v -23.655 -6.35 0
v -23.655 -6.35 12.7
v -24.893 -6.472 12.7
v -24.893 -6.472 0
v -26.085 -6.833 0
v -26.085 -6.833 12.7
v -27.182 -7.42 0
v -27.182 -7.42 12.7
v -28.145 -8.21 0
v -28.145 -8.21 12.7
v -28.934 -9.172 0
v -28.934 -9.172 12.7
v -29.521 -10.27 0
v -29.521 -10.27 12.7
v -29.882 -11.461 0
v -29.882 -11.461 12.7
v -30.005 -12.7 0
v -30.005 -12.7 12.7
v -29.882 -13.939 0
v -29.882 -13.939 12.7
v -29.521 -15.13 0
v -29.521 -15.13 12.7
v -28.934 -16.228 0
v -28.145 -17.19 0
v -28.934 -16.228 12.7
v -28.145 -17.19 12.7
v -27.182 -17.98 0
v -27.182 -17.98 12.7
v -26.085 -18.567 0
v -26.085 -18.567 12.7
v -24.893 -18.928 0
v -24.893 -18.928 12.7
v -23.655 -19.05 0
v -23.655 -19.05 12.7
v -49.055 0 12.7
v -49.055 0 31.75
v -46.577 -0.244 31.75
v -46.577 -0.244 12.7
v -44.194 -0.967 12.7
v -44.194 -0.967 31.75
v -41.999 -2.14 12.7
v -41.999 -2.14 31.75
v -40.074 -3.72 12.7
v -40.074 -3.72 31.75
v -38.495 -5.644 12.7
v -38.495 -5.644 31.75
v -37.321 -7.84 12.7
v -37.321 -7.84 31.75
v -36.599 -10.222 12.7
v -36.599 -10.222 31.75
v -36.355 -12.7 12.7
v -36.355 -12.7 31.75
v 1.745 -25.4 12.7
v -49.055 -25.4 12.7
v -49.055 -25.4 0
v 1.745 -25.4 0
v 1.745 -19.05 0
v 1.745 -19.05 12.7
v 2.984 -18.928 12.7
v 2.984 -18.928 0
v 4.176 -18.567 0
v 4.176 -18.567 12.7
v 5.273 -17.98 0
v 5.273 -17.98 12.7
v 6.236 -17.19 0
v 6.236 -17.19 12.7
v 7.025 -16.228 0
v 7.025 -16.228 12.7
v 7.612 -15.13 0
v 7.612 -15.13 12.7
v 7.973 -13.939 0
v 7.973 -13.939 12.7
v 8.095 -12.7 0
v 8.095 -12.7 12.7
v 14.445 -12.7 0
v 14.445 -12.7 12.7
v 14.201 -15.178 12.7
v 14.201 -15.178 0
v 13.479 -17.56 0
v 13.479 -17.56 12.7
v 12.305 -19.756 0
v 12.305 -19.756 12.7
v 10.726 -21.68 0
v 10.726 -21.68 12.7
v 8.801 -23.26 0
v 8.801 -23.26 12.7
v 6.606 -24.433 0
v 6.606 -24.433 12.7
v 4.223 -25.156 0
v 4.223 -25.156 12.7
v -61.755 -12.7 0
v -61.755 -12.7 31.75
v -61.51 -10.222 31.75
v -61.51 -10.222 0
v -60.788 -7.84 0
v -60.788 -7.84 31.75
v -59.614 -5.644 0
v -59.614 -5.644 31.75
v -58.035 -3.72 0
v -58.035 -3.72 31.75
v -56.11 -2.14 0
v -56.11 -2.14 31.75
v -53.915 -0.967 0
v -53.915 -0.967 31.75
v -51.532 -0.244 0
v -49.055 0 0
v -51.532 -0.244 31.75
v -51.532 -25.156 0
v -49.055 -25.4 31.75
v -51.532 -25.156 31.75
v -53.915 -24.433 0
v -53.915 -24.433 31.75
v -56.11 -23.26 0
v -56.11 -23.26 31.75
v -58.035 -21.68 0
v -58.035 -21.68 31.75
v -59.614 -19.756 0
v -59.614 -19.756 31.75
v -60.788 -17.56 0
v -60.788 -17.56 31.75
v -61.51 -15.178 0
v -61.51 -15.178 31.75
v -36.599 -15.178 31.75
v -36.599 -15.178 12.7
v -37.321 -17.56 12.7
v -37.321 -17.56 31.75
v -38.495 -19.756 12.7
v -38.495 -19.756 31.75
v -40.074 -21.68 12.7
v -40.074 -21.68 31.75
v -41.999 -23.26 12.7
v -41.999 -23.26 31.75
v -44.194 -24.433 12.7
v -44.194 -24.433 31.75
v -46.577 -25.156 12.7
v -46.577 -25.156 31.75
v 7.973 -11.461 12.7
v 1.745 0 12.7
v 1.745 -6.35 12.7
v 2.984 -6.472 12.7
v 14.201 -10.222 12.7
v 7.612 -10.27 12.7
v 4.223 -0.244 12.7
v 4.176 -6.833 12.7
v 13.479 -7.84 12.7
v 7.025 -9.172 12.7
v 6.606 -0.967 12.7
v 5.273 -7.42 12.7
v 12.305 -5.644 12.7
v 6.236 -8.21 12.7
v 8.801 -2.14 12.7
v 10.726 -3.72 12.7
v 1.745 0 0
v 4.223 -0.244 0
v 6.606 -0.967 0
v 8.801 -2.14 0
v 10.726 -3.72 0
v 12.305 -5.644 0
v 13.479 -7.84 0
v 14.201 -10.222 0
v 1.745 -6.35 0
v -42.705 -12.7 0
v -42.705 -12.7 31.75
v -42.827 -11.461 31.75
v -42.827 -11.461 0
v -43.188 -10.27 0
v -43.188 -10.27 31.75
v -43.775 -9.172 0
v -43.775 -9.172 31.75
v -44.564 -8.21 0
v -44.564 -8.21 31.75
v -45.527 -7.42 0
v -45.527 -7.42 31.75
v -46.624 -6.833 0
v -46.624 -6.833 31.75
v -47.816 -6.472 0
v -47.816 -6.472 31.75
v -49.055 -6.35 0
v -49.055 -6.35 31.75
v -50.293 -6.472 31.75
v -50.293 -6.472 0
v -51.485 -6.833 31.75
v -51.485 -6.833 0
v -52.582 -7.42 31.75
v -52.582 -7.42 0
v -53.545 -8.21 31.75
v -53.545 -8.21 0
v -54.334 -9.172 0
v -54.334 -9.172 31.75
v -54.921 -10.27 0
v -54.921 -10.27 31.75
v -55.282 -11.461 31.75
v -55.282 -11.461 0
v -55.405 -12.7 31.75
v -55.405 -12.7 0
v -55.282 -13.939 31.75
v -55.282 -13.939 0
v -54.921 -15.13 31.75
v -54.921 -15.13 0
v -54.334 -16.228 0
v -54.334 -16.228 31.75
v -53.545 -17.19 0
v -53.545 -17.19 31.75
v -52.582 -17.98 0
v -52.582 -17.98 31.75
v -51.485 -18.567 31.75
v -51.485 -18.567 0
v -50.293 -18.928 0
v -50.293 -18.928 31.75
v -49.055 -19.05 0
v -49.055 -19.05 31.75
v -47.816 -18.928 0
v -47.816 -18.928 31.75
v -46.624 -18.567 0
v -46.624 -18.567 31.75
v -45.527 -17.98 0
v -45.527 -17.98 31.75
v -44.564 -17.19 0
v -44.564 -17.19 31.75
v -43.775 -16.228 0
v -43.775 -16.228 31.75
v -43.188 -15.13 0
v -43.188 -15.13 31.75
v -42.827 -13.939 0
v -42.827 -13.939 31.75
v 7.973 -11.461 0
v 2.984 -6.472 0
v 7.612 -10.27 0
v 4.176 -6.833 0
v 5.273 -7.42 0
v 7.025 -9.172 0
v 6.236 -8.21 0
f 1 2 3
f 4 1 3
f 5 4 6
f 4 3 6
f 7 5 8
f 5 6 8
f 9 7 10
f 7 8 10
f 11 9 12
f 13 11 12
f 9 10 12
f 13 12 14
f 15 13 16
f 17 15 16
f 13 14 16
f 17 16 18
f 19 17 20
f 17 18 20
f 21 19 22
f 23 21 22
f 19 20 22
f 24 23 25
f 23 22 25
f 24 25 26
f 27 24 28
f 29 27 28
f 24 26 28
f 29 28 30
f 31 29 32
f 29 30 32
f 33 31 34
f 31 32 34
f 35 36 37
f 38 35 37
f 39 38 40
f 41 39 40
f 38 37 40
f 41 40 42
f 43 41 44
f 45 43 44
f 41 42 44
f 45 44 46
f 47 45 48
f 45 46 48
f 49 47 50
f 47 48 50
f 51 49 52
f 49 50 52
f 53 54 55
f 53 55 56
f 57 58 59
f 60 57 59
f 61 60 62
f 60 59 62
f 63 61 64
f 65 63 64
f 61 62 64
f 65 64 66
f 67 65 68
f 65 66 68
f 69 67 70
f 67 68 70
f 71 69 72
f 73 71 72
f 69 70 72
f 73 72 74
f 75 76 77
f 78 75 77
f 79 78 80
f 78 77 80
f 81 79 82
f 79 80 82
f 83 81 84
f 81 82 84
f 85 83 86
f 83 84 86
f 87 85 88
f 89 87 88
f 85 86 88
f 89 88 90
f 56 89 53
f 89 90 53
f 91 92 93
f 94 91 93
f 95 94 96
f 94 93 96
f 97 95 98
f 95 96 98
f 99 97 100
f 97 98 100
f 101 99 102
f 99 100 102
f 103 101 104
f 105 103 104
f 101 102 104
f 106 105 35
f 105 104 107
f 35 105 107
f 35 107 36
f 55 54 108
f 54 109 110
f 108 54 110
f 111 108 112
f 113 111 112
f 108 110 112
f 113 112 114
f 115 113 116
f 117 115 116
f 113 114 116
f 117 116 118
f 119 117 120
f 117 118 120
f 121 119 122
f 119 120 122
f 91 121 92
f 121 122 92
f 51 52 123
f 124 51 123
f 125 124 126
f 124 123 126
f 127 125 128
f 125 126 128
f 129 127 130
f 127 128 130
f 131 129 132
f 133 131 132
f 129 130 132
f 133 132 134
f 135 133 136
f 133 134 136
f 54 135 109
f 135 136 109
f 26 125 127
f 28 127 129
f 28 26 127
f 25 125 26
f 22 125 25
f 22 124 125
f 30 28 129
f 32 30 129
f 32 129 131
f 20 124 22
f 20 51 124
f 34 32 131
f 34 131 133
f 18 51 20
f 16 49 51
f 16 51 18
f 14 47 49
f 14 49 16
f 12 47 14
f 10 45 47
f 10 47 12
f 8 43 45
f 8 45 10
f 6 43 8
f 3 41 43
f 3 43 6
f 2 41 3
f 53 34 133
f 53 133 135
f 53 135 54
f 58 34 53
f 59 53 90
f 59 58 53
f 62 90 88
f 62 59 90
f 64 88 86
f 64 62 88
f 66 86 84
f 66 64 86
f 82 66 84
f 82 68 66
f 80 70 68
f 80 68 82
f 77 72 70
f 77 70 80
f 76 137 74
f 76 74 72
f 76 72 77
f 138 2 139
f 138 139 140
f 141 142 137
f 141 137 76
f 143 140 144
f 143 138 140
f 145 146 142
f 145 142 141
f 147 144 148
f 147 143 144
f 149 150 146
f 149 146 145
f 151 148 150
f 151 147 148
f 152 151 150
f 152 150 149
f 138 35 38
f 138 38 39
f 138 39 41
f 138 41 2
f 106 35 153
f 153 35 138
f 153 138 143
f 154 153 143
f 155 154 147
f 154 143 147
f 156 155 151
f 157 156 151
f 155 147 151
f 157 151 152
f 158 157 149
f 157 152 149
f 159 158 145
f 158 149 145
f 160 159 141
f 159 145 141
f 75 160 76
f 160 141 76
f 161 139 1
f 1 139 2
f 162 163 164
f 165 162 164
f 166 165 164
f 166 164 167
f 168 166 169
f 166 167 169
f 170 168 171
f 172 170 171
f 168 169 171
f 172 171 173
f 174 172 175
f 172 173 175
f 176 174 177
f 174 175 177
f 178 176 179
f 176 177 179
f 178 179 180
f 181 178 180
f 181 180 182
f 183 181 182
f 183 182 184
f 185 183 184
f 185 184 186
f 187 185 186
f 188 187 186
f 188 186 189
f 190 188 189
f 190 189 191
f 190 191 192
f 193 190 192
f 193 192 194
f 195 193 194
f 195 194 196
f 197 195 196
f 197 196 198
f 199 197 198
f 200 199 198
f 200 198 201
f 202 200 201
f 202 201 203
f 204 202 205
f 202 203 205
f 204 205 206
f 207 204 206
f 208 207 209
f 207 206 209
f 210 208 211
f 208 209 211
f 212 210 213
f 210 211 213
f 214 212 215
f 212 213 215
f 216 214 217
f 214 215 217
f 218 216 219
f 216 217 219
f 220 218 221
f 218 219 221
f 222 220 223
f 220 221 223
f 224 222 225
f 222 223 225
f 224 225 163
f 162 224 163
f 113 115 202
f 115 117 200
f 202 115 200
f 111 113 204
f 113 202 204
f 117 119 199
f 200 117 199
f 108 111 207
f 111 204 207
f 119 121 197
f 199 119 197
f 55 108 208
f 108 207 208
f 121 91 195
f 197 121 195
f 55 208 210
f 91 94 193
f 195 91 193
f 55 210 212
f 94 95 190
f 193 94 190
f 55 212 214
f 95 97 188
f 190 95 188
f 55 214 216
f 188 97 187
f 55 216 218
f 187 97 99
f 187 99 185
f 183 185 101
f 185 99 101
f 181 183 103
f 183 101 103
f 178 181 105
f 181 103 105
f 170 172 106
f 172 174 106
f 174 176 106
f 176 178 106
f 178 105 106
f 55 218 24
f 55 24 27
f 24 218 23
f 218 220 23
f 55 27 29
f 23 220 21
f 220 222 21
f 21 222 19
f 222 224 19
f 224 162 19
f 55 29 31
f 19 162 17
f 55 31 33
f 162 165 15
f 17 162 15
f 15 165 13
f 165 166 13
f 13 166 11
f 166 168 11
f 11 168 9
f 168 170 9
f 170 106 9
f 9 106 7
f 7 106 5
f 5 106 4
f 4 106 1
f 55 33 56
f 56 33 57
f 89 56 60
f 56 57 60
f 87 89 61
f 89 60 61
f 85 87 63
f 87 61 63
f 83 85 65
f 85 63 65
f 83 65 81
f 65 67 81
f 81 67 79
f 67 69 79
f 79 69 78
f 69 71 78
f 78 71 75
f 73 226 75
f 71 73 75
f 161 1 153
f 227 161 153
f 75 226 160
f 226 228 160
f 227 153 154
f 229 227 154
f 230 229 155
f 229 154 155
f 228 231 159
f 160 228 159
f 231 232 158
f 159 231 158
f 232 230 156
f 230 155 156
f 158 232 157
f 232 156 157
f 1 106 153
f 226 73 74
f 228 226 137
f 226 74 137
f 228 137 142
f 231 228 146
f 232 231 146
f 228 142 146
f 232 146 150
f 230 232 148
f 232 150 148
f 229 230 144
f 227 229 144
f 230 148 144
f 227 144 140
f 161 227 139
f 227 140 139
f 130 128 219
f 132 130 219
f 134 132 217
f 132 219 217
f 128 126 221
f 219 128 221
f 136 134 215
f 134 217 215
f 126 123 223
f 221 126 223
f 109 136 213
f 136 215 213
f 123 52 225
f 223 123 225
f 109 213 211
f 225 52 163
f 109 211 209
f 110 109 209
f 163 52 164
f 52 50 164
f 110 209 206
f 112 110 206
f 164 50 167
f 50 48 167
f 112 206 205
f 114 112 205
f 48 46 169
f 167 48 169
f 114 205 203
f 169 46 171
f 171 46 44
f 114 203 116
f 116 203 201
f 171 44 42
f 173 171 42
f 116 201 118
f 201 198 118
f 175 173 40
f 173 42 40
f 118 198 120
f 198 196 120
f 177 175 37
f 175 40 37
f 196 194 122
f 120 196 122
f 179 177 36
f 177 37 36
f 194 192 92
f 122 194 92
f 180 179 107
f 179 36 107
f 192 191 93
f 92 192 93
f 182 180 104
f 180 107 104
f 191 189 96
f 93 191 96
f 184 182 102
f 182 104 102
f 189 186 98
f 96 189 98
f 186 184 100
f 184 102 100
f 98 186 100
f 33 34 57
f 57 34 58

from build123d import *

# Parameters (mm, degrees)
F1_DEPTH  = 25.4
F2_R      = 6.35
F3_DEPTH  = 57.15
F5_DEPTH  = 31.75
F7_DEPTH  = 19.05
F9_DEPTH  = 12.7
F11_DEPTH = 12.7


with BuildPart() as f1:
    # F0 (on Front) → F1 (new body)
    with BuildSketch(Plane.XZ):
        Polygon((-36.3545019062, 31.75), (-61.7545019062, 31.75), (-61.7545019062, 0), (14.4454980938, 0), (14.4454980938, 12.7), (-36.3545019062, 12.7), align=None)
    extrude(amount=F1_DEPTH)

    # F2 (on face) → F3 (cut)
    with BuildSketch(Plane.XY.offset(31.75)):
        with Locations((-49.0545019062, -12.7)):
            Circle(F2_R)
    extrude(amount=-F3_DEPTH, mode=Mode.SUBTRACT)

    # F4 (on face) → F5 (cut)
    with BuildSketch(Plane.XY.offset(31.75)):
        with BuildLine():
            ThreePointArc((-61.7545019062, -12.6999997152), (-58.0347579265, -3.7197437782), (-49.0545019062, 0))
            Line((-49.0545019062, 0), (-61.7545019062, 0))
            Line((-61.7545019062, 0), (-61.7545019062, -12.6999997152))
        make_face()
        with BuildLine():
            Line((-61.7545019062, -25.4), (-49.0545019062, -25.4))
            ThreePointArc((-49.0545019062, -25.4), (-58.0347581279, -21.6802560204), (-61.7545019062, -12.6999997152))
            Line((-61.7545019062, -12.6999997152), (-61.7545019062, -25.4))
        make_face()
    extrude(amount=-F5_DEPTH, mode=Mode.SUBTRACT)

    # F6 (on face) → F7 (cut)
    with BuildSketch(Plane.XY.offset(31.75)):
        with BuildLine():
            ThreePointArc((-49.0545019062, 0), (-40.0742457851, -3.7197438789), (-36.3545019062, -12.7))
            Line((-36.3545019062, -12.7), (-36.3545019062, 0))
            Line((-36.3545019062, 0), (-49.0545019062, 0))
        make_face()
        with BuildLine():
            Line((-36.3545019062, -25.4), (-36.3545019062, -12.7))
            ThreePointArc((-36.3545019062, -12.7), (-40.0742457851, -21.6802561211), (-49.0545019062, -25.4))
            Line((-49.0545019062, -25.4), (-36.3545019062, -25.4))
        make_face()
    extrude(amount=-F7_DEPTH, mode=Mode.SUBTRACT)

    # F8 (on face) → F9 (cut)
    with BuildSketch(Plane.XY.offset(12.7)):
        with BuildLine():
            ThreePointArc((-23.6545019062, -19.05), (-19.1643738456, -17.1901280605), (-17.3045019062, -12.7))
            ThreePointArc((-17.3045019062, -12.7), (-19.1643738456, -8.2098719395), (-23.6545019062, -6.35))
            ThreePointArc((-23.6545019062, -6.35), (-30.0045019062, -12.7), (-23.6545019062, -19.05))
        make_face()
        with BuildLine():
            ThreePointArc((-23.6545019062, -6.35), (-19.1643738456, -8.2098719395), (-17.3045019062, -12.7))
            ThreePointArc((-17.3045019062, -12.7), (-19.1643738456, -17.1901280605), (-23.6545019062, -19.05))
            Line((-23.6545019062, -19.05), (1.7454980938, -19.05))
            ThreePointArc((1.7454980938, -19.05), (-4.6045019062, -12.7), (1.7454980938, -6.35))
            Line((1.7454980938, -6.35), (-23.6545019062, -6.35))
        make_face()
        with BuildLine():
            ThreePointArc((8.0954980938, -12.7), (6.2356261544, -8.2098719395), (1.7454980938, -6.35))
            ThreePointArc((1.7454980938, -6.35), (-4.6045019062, -12.7), (1.7454980938, -19.05))
            ThreePointArc((1.7454980938, -19.05), (6.2356261544, -17.1901280605), (8.0954980938, -12.7))
        make_face()
    extrude(amount=-F9_DEPTH, mode=Mode.SUBTRACT)

    # F10 (on face) → F11 (cut)
    with BuildSketch(Plane.XY.offset(12.7)):
        with BuildLine():
            ThreePointArc((1.7454980938, 0), (10.7257542149, -3.7197438789), (14.4454980938, -12.7))
            Line((14.4454980938, -12.7), (14.4454980938, 0))
            Line((14.4454980938, 0), (1.7454980938, 0))
        make_face()
        with BuildLine():
            Line((14.4454980938, -25.4), (14.4454980938, -12.7))
            ThreePointArc((14.4454980938, -12.7), (10.7257542149, -21.6802561211), (1.7454980938, -25.4))
            Line((1.7454980938, -25.4), (14.4454980938, -25.4))
        make_face()
    extrude(amount=-F11_DEPTH, mode=Mode.SUBTRACT)


solid = f1.part
